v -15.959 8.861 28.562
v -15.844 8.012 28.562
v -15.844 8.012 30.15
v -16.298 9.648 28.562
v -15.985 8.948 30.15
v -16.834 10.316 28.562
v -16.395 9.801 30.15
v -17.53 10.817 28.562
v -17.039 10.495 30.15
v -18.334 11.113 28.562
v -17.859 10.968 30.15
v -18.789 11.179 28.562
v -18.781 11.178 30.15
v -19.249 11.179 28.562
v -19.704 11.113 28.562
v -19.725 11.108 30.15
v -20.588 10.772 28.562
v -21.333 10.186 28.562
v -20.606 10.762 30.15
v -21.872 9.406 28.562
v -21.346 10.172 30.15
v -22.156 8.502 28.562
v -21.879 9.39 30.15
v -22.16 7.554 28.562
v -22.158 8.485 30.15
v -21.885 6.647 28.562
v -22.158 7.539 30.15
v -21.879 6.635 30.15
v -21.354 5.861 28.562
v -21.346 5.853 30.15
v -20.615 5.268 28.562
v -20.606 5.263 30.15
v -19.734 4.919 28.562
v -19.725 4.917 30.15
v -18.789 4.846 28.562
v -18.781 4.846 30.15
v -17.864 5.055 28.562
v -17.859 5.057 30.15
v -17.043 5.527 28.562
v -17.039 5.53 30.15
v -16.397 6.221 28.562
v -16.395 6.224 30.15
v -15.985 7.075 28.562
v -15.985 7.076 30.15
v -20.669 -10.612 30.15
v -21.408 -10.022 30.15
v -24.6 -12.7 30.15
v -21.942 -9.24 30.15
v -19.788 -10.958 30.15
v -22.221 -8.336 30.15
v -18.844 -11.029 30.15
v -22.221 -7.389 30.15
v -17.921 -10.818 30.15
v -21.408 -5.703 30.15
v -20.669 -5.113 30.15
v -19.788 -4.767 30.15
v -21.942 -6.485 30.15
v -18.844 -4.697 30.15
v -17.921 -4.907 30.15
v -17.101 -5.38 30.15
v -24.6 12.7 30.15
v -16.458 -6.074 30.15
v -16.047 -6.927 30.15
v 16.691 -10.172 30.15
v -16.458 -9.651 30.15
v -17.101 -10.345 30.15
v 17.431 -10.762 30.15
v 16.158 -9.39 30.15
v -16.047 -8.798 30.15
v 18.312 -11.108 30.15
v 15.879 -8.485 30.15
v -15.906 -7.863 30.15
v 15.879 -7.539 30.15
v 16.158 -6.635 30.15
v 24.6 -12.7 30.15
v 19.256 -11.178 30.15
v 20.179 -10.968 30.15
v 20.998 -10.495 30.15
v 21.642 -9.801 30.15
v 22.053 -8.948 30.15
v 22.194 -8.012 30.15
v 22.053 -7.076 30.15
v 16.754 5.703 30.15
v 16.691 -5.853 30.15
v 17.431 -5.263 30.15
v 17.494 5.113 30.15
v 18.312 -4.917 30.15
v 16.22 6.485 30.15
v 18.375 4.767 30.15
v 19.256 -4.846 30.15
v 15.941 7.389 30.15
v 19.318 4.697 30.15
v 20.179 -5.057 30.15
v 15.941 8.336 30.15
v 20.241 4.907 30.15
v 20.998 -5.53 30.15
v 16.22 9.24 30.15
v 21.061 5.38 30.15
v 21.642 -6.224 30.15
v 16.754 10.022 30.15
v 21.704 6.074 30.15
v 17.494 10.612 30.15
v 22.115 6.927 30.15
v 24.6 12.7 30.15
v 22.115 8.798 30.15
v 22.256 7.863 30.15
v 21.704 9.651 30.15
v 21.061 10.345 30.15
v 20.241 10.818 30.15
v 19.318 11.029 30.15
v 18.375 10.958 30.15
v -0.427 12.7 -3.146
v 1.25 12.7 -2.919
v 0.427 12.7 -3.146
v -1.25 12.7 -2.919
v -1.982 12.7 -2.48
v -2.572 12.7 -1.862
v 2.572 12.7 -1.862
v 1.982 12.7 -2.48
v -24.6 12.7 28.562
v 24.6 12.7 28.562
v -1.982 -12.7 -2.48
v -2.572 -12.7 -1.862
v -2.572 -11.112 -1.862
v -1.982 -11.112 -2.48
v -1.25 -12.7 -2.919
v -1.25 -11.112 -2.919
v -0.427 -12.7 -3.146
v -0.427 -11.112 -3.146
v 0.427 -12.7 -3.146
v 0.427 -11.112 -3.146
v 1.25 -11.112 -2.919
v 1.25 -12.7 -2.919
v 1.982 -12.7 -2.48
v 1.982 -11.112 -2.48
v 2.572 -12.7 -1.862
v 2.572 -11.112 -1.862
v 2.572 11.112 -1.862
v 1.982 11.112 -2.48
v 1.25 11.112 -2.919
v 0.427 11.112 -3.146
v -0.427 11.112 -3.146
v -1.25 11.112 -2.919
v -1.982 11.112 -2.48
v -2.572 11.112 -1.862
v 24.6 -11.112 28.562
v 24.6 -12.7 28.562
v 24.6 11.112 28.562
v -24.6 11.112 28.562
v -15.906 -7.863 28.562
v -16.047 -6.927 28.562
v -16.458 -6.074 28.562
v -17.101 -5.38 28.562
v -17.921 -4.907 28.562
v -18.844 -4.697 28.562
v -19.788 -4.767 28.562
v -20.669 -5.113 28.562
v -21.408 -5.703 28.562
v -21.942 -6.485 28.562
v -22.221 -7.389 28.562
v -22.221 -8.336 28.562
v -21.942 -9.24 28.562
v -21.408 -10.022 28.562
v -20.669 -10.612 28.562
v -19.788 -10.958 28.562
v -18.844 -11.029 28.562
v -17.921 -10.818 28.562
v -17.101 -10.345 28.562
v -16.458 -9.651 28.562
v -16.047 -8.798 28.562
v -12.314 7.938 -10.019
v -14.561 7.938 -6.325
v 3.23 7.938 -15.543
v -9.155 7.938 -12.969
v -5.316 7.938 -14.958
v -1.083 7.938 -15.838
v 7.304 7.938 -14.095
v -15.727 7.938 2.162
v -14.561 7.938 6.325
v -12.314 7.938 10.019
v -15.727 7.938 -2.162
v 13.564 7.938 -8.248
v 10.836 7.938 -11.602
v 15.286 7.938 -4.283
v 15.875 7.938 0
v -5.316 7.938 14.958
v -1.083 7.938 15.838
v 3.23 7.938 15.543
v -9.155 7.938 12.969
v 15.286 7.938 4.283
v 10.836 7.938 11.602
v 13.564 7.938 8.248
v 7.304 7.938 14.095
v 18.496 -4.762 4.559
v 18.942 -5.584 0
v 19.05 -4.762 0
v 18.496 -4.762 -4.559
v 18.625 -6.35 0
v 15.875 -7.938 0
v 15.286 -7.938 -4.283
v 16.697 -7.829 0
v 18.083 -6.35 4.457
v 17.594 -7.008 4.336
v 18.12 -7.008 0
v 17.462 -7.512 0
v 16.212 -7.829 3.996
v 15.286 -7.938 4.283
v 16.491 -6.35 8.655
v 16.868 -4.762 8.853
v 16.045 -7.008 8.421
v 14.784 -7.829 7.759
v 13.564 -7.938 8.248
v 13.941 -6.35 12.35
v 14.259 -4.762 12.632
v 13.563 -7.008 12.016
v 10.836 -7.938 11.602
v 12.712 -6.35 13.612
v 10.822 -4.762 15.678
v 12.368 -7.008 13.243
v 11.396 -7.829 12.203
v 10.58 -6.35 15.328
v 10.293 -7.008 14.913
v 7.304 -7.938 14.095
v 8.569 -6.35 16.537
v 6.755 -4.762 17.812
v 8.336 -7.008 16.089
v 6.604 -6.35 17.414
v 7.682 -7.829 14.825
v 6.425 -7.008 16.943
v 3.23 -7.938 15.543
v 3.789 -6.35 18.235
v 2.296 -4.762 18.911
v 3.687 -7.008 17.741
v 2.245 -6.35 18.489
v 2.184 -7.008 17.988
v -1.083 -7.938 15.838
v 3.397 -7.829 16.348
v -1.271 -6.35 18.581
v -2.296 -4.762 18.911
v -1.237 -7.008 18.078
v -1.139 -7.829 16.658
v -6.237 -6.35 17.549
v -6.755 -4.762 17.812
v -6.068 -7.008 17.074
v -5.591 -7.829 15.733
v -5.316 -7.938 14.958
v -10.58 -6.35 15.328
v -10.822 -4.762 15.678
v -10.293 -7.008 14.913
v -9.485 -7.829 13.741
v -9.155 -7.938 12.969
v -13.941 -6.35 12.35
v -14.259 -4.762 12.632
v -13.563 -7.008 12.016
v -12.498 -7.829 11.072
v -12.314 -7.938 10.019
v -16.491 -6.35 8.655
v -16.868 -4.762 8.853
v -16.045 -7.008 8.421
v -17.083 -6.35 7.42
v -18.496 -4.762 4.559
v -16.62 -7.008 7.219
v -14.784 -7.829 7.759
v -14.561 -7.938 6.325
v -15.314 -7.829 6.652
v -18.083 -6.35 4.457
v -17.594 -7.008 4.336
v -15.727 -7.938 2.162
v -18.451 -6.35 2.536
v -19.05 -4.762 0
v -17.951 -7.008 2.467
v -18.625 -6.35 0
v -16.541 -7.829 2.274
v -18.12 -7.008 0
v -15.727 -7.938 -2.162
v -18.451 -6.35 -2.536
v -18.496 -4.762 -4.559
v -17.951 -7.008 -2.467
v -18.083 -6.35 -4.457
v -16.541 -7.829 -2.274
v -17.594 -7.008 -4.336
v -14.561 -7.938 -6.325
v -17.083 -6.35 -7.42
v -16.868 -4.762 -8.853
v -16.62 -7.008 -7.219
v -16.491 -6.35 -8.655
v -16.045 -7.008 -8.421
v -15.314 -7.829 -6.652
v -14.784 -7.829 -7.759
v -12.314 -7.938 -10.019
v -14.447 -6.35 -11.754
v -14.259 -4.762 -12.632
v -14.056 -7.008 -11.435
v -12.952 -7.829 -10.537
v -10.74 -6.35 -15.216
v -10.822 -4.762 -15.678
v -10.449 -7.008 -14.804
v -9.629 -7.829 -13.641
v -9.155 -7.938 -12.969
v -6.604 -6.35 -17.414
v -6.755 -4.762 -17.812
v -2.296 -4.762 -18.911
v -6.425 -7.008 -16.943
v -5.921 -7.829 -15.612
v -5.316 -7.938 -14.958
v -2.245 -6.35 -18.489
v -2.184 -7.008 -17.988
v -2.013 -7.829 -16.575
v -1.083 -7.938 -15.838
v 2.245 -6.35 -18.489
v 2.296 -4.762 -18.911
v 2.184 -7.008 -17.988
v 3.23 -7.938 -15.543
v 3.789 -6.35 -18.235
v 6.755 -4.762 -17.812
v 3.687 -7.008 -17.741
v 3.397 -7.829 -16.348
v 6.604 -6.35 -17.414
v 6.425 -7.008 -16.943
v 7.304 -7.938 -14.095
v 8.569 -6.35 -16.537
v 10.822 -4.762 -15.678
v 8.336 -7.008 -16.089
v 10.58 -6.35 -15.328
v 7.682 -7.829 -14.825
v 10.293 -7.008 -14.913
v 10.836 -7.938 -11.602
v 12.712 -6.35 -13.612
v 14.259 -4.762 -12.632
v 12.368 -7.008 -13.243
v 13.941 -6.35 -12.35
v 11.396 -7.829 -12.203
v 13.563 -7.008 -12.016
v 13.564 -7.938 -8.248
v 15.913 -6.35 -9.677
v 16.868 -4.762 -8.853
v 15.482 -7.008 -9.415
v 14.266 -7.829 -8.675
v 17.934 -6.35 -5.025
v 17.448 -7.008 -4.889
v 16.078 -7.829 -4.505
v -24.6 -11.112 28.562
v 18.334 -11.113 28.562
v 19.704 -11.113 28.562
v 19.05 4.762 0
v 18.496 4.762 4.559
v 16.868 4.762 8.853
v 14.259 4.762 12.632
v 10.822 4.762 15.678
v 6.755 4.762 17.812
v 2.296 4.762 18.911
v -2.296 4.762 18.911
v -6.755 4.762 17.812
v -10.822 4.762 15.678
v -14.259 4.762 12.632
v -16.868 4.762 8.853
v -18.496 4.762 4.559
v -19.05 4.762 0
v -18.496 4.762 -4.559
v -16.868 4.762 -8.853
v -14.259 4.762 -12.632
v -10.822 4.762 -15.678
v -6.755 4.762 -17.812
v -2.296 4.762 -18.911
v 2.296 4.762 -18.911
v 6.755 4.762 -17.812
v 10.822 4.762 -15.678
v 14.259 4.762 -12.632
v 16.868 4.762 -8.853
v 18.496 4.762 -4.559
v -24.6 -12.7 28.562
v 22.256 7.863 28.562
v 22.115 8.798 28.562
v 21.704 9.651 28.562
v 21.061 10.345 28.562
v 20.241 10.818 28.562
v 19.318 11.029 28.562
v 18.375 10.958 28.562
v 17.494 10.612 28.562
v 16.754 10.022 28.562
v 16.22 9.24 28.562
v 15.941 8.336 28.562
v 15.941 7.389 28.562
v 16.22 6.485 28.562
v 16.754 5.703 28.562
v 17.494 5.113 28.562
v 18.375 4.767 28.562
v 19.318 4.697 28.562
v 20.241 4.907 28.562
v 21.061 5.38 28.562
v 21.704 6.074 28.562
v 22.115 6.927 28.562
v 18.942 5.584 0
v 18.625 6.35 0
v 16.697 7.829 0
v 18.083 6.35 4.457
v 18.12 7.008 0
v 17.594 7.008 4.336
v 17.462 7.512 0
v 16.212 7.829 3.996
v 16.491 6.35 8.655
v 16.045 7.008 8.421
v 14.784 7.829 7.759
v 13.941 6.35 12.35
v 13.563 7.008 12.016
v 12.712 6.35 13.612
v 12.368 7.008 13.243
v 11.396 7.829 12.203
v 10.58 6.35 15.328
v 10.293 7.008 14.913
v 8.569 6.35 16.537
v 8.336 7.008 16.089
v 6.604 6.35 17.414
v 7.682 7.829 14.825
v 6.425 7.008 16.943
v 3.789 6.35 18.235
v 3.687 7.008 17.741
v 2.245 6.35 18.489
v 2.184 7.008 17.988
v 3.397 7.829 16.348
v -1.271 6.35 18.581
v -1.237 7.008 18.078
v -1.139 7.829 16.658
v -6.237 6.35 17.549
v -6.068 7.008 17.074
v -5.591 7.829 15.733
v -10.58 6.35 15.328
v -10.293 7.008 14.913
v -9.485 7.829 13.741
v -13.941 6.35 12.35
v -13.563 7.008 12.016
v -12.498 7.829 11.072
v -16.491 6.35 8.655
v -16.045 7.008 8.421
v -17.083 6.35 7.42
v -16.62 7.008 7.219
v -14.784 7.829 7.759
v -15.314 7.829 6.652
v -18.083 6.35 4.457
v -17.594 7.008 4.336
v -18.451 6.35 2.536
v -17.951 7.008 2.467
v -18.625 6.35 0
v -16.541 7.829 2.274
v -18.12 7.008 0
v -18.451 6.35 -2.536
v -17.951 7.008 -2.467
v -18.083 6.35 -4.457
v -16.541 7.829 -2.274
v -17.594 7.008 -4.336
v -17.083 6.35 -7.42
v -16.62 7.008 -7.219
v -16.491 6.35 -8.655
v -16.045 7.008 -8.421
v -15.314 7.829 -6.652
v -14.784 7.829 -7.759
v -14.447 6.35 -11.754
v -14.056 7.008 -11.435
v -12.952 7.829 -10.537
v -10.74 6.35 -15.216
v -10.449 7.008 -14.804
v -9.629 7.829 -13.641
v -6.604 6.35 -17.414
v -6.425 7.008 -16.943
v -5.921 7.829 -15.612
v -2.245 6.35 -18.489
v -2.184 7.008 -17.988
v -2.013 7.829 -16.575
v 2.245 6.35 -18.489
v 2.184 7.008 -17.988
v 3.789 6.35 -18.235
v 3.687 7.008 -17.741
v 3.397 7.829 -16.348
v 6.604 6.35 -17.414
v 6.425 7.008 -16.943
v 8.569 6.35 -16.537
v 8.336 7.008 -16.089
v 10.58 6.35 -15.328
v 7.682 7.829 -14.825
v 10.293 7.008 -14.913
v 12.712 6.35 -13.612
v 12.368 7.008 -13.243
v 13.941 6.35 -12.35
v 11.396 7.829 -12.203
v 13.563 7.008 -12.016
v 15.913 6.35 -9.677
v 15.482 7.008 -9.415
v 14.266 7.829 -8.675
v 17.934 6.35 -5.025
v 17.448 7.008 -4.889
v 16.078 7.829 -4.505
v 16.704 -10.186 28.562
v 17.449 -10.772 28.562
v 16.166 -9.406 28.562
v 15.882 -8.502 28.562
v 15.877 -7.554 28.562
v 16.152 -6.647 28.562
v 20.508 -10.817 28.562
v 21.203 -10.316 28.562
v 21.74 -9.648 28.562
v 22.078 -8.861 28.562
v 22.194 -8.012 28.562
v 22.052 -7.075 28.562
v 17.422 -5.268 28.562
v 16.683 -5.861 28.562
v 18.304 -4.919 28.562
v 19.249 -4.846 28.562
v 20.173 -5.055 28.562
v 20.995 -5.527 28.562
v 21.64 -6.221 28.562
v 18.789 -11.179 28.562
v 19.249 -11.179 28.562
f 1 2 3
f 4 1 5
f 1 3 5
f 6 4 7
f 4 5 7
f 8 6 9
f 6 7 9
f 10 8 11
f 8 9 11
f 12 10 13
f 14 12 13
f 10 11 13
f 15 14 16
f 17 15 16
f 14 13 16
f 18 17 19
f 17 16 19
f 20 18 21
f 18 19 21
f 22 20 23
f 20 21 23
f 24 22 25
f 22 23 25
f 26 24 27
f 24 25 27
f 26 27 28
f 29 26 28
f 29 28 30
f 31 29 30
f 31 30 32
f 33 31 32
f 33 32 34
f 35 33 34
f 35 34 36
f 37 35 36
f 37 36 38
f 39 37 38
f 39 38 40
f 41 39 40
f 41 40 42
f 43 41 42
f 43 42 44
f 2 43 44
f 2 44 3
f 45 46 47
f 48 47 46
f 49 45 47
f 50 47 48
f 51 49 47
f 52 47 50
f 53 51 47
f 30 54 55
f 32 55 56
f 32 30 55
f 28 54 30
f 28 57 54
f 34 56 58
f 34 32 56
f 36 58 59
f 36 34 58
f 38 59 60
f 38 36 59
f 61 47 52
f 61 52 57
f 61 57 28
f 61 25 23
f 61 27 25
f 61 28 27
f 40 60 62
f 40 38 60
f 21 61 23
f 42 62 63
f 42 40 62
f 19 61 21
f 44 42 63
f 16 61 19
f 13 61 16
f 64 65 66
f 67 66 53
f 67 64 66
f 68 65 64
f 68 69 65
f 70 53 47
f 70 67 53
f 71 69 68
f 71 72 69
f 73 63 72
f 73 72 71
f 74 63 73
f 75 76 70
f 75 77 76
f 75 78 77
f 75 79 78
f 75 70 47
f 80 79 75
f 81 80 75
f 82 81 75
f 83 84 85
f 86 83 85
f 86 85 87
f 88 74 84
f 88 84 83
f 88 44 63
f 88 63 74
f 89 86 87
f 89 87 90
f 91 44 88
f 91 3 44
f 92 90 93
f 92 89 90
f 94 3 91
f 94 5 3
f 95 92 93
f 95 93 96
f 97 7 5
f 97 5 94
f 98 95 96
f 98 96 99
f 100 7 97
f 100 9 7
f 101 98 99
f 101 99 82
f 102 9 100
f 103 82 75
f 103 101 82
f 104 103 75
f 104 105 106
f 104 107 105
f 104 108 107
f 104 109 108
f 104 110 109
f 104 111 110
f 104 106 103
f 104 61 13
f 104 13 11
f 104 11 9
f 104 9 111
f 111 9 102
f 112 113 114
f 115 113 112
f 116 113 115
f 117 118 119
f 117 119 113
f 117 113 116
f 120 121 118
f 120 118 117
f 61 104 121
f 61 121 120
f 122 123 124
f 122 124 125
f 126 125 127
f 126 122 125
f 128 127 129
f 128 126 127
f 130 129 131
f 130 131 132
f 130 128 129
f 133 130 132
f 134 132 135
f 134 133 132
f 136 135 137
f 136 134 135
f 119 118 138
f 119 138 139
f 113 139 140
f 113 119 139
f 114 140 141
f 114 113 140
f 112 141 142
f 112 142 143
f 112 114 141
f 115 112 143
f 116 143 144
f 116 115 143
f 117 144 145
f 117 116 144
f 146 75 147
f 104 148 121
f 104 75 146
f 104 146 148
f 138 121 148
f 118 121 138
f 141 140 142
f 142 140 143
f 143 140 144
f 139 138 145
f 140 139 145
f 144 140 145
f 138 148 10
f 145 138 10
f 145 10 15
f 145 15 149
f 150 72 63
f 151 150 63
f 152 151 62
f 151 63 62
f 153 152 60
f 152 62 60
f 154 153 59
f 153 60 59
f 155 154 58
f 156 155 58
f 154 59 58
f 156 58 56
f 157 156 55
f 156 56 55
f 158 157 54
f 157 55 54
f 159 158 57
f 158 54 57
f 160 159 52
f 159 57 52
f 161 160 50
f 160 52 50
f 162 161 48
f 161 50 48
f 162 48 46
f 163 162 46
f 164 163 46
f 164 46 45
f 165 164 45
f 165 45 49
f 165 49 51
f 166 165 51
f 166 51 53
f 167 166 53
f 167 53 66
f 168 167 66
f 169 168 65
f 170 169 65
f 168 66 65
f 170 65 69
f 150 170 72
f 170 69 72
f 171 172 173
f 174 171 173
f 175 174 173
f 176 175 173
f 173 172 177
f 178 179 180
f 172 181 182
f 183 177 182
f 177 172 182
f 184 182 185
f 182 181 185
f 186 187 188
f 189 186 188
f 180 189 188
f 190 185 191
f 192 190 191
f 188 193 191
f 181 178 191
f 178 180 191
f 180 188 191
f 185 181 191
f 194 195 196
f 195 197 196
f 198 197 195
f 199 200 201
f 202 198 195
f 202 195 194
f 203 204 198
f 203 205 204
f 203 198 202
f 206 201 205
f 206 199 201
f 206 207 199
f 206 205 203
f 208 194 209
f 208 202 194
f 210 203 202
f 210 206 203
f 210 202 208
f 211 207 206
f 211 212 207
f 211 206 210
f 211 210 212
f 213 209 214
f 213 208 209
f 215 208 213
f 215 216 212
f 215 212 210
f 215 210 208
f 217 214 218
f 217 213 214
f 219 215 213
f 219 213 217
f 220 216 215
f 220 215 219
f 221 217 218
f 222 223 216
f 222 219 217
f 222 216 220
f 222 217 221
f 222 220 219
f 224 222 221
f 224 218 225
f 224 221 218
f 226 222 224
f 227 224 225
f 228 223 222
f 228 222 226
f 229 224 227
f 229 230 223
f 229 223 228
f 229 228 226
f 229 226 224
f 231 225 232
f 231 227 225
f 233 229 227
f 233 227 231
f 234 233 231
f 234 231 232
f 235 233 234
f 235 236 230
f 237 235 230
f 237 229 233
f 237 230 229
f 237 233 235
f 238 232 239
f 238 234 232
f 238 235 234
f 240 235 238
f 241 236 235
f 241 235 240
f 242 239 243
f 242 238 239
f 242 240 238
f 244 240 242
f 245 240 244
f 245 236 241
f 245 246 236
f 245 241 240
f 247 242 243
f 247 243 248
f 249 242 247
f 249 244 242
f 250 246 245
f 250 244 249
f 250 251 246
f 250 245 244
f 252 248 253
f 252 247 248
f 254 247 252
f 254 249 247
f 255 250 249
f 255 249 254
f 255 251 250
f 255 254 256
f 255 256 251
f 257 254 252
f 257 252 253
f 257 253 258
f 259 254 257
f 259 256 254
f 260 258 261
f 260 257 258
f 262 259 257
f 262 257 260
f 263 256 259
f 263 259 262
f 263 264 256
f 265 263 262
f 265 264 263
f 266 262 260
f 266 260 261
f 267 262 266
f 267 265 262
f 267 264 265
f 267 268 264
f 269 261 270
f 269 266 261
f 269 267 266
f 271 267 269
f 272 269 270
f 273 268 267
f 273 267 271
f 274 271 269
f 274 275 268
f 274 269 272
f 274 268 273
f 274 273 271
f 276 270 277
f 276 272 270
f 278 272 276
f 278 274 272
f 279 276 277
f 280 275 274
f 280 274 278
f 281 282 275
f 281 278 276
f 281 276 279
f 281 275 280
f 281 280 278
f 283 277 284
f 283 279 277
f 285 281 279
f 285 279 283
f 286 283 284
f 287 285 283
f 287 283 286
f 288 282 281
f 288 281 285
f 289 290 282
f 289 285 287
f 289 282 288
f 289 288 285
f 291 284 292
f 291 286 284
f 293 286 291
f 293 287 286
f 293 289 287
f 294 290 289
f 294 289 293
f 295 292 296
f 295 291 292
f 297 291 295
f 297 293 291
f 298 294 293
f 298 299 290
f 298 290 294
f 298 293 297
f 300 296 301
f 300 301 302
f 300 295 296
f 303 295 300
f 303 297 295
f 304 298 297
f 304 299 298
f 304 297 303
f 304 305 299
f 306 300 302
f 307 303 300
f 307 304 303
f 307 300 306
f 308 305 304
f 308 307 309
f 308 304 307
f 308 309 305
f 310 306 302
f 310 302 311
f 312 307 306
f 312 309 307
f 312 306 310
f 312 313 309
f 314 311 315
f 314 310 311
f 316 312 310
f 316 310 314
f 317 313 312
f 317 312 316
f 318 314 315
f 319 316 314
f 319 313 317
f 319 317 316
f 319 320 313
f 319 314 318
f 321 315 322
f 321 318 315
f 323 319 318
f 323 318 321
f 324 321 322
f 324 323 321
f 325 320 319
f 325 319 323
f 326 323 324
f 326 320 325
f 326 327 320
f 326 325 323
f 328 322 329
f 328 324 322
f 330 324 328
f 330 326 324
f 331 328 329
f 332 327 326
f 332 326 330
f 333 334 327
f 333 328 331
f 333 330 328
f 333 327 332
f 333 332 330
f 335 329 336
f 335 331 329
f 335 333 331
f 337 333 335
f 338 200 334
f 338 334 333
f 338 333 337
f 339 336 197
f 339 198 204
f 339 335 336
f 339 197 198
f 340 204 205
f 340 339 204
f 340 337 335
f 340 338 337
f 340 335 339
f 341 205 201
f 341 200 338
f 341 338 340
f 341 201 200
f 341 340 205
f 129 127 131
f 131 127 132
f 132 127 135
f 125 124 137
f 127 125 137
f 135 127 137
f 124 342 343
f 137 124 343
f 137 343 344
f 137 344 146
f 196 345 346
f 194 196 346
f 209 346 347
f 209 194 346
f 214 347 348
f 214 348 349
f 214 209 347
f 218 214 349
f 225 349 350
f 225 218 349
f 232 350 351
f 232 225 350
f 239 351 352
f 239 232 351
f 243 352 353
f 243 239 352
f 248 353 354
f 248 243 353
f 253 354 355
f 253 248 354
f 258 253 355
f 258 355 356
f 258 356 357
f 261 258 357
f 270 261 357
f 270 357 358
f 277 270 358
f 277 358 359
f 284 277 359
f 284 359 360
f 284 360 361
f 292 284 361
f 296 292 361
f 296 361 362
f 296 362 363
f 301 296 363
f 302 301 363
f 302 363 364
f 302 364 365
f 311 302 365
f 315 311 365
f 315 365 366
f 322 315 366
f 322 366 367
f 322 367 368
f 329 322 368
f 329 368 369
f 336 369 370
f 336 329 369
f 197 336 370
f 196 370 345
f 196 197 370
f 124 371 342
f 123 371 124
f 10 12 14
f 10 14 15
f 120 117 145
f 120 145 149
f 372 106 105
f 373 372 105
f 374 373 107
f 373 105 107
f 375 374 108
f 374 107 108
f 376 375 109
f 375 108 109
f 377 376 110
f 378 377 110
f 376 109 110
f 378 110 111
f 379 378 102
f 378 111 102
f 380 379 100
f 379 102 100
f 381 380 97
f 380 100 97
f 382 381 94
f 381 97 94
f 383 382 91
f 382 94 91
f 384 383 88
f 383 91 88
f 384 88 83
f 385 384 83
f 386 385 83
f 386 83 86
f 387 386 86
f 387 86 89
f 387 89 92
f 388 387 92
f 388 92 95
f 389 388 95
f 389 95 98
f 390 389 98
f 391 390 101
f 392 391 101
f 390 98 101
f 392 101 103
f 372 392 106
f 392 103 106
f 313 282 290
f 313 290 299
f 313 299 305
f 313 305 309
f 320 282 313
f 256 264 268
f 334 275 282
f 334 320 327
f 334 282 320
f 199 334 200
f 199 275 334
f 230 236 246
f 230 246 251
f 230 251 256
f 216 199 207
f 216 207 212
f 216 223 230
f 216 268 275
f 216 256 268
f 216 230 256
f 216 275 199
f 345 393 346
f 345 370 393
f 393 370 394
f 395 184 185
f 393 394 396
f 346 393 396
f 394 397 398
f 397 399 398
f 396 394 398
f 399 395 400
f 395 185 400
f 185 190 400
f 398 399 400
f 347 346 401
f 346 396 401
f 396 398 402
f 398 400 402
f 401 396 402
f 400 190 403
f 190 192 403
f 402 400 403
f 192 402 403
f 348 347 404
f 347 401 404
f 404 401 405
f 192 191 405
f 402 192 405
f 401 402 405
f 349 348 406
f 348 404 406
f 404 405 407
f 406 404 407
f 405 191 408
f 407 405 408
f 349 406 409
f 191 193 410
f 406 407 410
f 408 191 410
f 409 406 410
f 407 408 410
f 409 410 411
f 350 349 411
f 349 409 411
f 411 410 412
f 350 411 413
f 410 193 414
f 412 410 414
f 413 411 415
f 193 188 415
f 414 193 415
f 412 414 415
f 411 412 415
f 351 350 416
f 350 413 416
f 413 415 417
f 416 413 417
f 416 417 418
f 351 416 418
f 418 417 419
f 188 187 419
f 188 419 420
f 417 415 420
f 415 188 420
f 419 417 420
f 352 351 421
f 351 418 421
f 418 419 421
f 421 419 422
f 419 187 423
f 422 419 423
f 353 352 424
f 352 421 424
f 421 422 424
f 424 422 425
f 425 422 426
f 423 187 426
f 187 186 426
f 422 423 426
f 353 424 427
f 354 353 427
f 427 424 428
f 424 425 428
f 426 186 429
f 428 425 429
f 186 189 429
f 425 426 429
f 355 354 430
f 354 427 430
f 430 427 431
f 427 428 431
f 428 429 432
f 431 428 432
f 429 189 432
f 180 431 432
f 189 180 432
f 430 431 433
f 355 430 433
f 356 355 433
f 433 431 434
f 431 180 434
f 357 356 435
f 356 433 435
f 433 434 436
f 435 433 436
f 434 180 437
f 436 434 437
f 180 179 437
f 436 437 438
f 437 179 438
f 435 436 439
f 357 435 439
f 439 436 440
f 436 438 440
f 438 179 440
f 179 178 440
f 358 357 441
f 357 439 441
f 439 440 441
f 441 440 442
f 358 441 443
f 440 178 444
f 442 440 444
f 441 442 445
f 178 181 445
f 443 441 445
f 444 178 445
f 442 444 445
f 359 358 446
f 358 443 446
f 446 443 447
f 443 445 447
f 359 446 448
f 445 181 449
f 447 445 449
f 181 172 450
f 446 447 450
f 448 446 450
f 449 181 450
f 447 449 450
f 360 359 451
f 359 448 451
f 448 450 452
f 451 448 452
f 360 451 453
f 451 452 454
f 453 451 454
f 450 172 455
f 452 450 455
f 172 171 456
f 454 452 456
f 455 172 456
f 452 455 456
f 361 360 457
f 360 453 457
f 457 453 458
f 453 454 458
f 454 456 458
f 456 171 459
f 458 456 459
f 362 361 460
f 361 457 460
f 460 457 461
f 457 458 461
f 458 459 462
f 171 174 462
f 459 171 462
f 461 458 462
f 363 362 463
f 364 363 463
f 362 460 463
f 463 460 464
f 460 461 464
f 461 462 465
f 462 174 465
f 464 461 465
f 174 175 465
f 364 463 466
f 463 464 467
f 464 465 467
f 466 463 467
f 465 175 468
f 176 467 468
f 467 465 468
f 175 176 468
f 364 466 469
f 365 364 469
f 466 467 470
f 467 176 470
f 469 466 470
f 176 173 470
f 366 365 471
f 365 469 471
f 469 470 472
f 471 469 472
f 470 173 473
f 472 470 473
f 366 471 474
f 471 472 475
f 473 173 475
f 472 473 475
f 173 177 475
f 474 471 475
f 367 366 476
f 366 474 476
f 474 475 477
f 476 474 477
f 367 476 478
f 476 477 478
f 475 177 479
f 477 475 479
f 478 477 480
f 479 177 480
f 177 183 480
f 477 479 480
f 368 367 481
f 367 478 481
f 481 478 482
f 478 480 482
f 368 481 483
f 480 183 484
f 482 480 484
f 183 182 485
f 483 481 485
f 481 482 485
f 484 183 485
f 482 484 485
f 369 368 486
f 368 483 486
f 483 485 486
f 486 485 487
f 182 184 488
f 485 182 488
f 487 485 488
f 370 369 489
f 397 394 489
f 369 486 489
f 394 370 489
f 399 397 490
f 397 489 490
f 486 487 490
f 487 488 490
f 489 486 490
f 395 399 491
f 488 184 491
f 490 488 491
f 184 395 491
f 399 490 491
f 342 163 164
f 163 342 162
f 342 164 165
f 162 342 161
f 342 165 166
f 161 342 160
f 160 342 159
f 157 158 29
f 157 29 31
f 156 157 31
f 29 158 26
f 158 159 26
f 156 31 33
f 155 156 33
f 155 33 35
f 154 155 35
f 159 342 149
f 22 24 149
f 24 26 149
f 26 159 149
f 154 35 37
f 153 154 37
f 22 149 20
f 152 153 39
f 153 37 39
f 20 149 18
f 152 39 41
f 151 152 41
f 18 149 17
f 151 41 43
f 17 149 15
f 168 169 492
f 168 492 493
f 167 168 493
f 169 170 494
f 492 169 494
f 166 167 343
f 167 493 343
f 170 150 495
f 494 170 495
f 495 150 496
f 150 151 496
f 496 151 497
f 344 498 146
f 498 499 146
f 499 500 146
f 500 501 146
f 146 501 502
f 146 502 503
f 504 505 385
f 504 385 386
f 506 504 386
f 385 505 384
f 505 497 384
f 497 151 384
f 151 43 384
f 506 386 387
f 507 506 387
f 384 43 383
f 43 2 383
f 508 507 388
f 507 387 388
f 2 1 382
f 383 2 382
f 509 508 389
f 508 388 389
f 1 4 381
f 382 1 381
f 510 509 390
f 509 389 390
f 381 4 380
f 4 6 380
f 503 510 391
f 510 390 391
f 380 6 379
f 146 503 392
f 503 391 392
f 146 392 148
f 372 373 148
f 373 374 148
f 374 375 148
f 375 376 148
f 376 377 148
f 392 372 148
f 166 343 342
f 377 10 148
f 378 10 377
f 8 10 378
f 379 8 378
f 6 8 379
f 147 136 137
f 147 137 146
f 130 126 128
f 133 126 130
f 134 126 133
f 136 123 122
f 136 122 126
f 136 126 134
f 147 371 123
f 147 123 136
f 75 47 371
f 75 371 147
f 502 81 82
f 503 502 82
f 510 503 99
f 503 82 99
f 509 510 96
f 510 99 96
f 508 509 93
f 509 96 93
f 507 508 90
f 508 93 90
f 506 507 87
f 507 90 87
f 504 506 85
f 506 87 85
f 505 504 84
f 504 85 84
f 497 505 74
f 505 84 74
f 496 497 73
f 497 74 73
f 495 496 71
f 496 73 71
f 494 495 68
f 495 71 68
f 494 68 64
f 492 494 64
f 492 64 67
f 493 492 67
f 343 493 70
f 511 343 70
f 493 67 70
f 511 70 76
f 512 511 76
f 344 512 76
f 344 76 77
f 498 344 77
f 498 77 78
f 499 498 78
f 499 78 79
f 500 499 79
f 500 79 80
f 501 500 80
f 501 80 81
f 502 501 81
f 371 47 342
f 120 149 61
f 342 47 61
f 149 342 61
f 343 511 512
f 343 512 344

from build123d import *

# Parameters (mm, degrees)
F0_R     = 19.05
F1_DEPTH = 7.9375
F2_R     = 3.175
F4_W     = 49.1998
F4_H     = 25.4
F4_R     = 3.175
F5_DEPTH = 1.5875
F7_DEPTH = 1.5875
F9_DEPTH = 1.5875


with BuildPart() as f1:
    # F0 (on Front) → F1 (new body, symmetric)
    with BuildSketch(Plane.XZ):
        Circle(F0_R)
    extrude(amount=F1_DEPTH, both=True)

    # F2
    f2_edges = [f1.edges().sort_by_distance(p)[0] for p in [
        (-19.05, 7.9375, 0),
        (-19.05, -7.9375, 0),
    ]]
    fillet(f2_edges, radius=F2_R)


with BuildPart() as f5:
    # F4 (on offset) → F5 (new body)
    with BuildSketch(Plane.XY.offset(30.1498)):
        Rectangle(F4_W, F4_H)
        with Locations((-19.081018, -7.862644)):
            Circle(F4_R, mode=Mode.SUBTRACT)
        with Locations((19.018688, -8.012234)):
            Circle(F4_R, mode=Mode.SUBTRACT)
        with Locations((-19.018688, 8.012234)):
            Circle(F4_R, mode=Mode.SUBTRACT)
        with Locations((19.081018, 7.862644)):
            Circle(F4_R, mode=Mode.SUBTRACT)
    extrude(amount=-F5_DEPTH)

    # F6 (on face) → F7 (join)
    with BuildSketch(Plane.XZ.offset(12.7)):
        with BuildLine():
            Line((-24.5999, 28.5623), (-2.571694, -1.861992))
            ThreePointArc((-2.571694, -1.861992), (0, -3.175), (2.571694, -1.861992))
            Line((2.571694, -1.861992), (24.5999, 28.5623))
            Line((24.5999, 28.5623), (-24.5999, 28.5623))
        make_face()
    extrude(amount=-F7_DEPTH)

    # F8 (on face) → F9 (join)
    with BuildSketch(Plane(origin=(0, 12.7, 0), x_dir=(-1, 0, 0), z_dir=(0, 1, 0))):
        with BuildLine():
            Line((-24.5999, 28.5623), (-2.571694, -1.861992))
            ThreePointArc((-2.571694, -1.861992), (0, -3.175), (2.571694, -1.861992))
            Line((2.571694, -1.861992), (24.5999, 28.5623))
            Line((24.5999, 28.5623), (-24.5999, 28.5623))
        make_face()
    extrude(amount=-F9_DEPTH)


solid = Compound([f1.part, f5.part])
